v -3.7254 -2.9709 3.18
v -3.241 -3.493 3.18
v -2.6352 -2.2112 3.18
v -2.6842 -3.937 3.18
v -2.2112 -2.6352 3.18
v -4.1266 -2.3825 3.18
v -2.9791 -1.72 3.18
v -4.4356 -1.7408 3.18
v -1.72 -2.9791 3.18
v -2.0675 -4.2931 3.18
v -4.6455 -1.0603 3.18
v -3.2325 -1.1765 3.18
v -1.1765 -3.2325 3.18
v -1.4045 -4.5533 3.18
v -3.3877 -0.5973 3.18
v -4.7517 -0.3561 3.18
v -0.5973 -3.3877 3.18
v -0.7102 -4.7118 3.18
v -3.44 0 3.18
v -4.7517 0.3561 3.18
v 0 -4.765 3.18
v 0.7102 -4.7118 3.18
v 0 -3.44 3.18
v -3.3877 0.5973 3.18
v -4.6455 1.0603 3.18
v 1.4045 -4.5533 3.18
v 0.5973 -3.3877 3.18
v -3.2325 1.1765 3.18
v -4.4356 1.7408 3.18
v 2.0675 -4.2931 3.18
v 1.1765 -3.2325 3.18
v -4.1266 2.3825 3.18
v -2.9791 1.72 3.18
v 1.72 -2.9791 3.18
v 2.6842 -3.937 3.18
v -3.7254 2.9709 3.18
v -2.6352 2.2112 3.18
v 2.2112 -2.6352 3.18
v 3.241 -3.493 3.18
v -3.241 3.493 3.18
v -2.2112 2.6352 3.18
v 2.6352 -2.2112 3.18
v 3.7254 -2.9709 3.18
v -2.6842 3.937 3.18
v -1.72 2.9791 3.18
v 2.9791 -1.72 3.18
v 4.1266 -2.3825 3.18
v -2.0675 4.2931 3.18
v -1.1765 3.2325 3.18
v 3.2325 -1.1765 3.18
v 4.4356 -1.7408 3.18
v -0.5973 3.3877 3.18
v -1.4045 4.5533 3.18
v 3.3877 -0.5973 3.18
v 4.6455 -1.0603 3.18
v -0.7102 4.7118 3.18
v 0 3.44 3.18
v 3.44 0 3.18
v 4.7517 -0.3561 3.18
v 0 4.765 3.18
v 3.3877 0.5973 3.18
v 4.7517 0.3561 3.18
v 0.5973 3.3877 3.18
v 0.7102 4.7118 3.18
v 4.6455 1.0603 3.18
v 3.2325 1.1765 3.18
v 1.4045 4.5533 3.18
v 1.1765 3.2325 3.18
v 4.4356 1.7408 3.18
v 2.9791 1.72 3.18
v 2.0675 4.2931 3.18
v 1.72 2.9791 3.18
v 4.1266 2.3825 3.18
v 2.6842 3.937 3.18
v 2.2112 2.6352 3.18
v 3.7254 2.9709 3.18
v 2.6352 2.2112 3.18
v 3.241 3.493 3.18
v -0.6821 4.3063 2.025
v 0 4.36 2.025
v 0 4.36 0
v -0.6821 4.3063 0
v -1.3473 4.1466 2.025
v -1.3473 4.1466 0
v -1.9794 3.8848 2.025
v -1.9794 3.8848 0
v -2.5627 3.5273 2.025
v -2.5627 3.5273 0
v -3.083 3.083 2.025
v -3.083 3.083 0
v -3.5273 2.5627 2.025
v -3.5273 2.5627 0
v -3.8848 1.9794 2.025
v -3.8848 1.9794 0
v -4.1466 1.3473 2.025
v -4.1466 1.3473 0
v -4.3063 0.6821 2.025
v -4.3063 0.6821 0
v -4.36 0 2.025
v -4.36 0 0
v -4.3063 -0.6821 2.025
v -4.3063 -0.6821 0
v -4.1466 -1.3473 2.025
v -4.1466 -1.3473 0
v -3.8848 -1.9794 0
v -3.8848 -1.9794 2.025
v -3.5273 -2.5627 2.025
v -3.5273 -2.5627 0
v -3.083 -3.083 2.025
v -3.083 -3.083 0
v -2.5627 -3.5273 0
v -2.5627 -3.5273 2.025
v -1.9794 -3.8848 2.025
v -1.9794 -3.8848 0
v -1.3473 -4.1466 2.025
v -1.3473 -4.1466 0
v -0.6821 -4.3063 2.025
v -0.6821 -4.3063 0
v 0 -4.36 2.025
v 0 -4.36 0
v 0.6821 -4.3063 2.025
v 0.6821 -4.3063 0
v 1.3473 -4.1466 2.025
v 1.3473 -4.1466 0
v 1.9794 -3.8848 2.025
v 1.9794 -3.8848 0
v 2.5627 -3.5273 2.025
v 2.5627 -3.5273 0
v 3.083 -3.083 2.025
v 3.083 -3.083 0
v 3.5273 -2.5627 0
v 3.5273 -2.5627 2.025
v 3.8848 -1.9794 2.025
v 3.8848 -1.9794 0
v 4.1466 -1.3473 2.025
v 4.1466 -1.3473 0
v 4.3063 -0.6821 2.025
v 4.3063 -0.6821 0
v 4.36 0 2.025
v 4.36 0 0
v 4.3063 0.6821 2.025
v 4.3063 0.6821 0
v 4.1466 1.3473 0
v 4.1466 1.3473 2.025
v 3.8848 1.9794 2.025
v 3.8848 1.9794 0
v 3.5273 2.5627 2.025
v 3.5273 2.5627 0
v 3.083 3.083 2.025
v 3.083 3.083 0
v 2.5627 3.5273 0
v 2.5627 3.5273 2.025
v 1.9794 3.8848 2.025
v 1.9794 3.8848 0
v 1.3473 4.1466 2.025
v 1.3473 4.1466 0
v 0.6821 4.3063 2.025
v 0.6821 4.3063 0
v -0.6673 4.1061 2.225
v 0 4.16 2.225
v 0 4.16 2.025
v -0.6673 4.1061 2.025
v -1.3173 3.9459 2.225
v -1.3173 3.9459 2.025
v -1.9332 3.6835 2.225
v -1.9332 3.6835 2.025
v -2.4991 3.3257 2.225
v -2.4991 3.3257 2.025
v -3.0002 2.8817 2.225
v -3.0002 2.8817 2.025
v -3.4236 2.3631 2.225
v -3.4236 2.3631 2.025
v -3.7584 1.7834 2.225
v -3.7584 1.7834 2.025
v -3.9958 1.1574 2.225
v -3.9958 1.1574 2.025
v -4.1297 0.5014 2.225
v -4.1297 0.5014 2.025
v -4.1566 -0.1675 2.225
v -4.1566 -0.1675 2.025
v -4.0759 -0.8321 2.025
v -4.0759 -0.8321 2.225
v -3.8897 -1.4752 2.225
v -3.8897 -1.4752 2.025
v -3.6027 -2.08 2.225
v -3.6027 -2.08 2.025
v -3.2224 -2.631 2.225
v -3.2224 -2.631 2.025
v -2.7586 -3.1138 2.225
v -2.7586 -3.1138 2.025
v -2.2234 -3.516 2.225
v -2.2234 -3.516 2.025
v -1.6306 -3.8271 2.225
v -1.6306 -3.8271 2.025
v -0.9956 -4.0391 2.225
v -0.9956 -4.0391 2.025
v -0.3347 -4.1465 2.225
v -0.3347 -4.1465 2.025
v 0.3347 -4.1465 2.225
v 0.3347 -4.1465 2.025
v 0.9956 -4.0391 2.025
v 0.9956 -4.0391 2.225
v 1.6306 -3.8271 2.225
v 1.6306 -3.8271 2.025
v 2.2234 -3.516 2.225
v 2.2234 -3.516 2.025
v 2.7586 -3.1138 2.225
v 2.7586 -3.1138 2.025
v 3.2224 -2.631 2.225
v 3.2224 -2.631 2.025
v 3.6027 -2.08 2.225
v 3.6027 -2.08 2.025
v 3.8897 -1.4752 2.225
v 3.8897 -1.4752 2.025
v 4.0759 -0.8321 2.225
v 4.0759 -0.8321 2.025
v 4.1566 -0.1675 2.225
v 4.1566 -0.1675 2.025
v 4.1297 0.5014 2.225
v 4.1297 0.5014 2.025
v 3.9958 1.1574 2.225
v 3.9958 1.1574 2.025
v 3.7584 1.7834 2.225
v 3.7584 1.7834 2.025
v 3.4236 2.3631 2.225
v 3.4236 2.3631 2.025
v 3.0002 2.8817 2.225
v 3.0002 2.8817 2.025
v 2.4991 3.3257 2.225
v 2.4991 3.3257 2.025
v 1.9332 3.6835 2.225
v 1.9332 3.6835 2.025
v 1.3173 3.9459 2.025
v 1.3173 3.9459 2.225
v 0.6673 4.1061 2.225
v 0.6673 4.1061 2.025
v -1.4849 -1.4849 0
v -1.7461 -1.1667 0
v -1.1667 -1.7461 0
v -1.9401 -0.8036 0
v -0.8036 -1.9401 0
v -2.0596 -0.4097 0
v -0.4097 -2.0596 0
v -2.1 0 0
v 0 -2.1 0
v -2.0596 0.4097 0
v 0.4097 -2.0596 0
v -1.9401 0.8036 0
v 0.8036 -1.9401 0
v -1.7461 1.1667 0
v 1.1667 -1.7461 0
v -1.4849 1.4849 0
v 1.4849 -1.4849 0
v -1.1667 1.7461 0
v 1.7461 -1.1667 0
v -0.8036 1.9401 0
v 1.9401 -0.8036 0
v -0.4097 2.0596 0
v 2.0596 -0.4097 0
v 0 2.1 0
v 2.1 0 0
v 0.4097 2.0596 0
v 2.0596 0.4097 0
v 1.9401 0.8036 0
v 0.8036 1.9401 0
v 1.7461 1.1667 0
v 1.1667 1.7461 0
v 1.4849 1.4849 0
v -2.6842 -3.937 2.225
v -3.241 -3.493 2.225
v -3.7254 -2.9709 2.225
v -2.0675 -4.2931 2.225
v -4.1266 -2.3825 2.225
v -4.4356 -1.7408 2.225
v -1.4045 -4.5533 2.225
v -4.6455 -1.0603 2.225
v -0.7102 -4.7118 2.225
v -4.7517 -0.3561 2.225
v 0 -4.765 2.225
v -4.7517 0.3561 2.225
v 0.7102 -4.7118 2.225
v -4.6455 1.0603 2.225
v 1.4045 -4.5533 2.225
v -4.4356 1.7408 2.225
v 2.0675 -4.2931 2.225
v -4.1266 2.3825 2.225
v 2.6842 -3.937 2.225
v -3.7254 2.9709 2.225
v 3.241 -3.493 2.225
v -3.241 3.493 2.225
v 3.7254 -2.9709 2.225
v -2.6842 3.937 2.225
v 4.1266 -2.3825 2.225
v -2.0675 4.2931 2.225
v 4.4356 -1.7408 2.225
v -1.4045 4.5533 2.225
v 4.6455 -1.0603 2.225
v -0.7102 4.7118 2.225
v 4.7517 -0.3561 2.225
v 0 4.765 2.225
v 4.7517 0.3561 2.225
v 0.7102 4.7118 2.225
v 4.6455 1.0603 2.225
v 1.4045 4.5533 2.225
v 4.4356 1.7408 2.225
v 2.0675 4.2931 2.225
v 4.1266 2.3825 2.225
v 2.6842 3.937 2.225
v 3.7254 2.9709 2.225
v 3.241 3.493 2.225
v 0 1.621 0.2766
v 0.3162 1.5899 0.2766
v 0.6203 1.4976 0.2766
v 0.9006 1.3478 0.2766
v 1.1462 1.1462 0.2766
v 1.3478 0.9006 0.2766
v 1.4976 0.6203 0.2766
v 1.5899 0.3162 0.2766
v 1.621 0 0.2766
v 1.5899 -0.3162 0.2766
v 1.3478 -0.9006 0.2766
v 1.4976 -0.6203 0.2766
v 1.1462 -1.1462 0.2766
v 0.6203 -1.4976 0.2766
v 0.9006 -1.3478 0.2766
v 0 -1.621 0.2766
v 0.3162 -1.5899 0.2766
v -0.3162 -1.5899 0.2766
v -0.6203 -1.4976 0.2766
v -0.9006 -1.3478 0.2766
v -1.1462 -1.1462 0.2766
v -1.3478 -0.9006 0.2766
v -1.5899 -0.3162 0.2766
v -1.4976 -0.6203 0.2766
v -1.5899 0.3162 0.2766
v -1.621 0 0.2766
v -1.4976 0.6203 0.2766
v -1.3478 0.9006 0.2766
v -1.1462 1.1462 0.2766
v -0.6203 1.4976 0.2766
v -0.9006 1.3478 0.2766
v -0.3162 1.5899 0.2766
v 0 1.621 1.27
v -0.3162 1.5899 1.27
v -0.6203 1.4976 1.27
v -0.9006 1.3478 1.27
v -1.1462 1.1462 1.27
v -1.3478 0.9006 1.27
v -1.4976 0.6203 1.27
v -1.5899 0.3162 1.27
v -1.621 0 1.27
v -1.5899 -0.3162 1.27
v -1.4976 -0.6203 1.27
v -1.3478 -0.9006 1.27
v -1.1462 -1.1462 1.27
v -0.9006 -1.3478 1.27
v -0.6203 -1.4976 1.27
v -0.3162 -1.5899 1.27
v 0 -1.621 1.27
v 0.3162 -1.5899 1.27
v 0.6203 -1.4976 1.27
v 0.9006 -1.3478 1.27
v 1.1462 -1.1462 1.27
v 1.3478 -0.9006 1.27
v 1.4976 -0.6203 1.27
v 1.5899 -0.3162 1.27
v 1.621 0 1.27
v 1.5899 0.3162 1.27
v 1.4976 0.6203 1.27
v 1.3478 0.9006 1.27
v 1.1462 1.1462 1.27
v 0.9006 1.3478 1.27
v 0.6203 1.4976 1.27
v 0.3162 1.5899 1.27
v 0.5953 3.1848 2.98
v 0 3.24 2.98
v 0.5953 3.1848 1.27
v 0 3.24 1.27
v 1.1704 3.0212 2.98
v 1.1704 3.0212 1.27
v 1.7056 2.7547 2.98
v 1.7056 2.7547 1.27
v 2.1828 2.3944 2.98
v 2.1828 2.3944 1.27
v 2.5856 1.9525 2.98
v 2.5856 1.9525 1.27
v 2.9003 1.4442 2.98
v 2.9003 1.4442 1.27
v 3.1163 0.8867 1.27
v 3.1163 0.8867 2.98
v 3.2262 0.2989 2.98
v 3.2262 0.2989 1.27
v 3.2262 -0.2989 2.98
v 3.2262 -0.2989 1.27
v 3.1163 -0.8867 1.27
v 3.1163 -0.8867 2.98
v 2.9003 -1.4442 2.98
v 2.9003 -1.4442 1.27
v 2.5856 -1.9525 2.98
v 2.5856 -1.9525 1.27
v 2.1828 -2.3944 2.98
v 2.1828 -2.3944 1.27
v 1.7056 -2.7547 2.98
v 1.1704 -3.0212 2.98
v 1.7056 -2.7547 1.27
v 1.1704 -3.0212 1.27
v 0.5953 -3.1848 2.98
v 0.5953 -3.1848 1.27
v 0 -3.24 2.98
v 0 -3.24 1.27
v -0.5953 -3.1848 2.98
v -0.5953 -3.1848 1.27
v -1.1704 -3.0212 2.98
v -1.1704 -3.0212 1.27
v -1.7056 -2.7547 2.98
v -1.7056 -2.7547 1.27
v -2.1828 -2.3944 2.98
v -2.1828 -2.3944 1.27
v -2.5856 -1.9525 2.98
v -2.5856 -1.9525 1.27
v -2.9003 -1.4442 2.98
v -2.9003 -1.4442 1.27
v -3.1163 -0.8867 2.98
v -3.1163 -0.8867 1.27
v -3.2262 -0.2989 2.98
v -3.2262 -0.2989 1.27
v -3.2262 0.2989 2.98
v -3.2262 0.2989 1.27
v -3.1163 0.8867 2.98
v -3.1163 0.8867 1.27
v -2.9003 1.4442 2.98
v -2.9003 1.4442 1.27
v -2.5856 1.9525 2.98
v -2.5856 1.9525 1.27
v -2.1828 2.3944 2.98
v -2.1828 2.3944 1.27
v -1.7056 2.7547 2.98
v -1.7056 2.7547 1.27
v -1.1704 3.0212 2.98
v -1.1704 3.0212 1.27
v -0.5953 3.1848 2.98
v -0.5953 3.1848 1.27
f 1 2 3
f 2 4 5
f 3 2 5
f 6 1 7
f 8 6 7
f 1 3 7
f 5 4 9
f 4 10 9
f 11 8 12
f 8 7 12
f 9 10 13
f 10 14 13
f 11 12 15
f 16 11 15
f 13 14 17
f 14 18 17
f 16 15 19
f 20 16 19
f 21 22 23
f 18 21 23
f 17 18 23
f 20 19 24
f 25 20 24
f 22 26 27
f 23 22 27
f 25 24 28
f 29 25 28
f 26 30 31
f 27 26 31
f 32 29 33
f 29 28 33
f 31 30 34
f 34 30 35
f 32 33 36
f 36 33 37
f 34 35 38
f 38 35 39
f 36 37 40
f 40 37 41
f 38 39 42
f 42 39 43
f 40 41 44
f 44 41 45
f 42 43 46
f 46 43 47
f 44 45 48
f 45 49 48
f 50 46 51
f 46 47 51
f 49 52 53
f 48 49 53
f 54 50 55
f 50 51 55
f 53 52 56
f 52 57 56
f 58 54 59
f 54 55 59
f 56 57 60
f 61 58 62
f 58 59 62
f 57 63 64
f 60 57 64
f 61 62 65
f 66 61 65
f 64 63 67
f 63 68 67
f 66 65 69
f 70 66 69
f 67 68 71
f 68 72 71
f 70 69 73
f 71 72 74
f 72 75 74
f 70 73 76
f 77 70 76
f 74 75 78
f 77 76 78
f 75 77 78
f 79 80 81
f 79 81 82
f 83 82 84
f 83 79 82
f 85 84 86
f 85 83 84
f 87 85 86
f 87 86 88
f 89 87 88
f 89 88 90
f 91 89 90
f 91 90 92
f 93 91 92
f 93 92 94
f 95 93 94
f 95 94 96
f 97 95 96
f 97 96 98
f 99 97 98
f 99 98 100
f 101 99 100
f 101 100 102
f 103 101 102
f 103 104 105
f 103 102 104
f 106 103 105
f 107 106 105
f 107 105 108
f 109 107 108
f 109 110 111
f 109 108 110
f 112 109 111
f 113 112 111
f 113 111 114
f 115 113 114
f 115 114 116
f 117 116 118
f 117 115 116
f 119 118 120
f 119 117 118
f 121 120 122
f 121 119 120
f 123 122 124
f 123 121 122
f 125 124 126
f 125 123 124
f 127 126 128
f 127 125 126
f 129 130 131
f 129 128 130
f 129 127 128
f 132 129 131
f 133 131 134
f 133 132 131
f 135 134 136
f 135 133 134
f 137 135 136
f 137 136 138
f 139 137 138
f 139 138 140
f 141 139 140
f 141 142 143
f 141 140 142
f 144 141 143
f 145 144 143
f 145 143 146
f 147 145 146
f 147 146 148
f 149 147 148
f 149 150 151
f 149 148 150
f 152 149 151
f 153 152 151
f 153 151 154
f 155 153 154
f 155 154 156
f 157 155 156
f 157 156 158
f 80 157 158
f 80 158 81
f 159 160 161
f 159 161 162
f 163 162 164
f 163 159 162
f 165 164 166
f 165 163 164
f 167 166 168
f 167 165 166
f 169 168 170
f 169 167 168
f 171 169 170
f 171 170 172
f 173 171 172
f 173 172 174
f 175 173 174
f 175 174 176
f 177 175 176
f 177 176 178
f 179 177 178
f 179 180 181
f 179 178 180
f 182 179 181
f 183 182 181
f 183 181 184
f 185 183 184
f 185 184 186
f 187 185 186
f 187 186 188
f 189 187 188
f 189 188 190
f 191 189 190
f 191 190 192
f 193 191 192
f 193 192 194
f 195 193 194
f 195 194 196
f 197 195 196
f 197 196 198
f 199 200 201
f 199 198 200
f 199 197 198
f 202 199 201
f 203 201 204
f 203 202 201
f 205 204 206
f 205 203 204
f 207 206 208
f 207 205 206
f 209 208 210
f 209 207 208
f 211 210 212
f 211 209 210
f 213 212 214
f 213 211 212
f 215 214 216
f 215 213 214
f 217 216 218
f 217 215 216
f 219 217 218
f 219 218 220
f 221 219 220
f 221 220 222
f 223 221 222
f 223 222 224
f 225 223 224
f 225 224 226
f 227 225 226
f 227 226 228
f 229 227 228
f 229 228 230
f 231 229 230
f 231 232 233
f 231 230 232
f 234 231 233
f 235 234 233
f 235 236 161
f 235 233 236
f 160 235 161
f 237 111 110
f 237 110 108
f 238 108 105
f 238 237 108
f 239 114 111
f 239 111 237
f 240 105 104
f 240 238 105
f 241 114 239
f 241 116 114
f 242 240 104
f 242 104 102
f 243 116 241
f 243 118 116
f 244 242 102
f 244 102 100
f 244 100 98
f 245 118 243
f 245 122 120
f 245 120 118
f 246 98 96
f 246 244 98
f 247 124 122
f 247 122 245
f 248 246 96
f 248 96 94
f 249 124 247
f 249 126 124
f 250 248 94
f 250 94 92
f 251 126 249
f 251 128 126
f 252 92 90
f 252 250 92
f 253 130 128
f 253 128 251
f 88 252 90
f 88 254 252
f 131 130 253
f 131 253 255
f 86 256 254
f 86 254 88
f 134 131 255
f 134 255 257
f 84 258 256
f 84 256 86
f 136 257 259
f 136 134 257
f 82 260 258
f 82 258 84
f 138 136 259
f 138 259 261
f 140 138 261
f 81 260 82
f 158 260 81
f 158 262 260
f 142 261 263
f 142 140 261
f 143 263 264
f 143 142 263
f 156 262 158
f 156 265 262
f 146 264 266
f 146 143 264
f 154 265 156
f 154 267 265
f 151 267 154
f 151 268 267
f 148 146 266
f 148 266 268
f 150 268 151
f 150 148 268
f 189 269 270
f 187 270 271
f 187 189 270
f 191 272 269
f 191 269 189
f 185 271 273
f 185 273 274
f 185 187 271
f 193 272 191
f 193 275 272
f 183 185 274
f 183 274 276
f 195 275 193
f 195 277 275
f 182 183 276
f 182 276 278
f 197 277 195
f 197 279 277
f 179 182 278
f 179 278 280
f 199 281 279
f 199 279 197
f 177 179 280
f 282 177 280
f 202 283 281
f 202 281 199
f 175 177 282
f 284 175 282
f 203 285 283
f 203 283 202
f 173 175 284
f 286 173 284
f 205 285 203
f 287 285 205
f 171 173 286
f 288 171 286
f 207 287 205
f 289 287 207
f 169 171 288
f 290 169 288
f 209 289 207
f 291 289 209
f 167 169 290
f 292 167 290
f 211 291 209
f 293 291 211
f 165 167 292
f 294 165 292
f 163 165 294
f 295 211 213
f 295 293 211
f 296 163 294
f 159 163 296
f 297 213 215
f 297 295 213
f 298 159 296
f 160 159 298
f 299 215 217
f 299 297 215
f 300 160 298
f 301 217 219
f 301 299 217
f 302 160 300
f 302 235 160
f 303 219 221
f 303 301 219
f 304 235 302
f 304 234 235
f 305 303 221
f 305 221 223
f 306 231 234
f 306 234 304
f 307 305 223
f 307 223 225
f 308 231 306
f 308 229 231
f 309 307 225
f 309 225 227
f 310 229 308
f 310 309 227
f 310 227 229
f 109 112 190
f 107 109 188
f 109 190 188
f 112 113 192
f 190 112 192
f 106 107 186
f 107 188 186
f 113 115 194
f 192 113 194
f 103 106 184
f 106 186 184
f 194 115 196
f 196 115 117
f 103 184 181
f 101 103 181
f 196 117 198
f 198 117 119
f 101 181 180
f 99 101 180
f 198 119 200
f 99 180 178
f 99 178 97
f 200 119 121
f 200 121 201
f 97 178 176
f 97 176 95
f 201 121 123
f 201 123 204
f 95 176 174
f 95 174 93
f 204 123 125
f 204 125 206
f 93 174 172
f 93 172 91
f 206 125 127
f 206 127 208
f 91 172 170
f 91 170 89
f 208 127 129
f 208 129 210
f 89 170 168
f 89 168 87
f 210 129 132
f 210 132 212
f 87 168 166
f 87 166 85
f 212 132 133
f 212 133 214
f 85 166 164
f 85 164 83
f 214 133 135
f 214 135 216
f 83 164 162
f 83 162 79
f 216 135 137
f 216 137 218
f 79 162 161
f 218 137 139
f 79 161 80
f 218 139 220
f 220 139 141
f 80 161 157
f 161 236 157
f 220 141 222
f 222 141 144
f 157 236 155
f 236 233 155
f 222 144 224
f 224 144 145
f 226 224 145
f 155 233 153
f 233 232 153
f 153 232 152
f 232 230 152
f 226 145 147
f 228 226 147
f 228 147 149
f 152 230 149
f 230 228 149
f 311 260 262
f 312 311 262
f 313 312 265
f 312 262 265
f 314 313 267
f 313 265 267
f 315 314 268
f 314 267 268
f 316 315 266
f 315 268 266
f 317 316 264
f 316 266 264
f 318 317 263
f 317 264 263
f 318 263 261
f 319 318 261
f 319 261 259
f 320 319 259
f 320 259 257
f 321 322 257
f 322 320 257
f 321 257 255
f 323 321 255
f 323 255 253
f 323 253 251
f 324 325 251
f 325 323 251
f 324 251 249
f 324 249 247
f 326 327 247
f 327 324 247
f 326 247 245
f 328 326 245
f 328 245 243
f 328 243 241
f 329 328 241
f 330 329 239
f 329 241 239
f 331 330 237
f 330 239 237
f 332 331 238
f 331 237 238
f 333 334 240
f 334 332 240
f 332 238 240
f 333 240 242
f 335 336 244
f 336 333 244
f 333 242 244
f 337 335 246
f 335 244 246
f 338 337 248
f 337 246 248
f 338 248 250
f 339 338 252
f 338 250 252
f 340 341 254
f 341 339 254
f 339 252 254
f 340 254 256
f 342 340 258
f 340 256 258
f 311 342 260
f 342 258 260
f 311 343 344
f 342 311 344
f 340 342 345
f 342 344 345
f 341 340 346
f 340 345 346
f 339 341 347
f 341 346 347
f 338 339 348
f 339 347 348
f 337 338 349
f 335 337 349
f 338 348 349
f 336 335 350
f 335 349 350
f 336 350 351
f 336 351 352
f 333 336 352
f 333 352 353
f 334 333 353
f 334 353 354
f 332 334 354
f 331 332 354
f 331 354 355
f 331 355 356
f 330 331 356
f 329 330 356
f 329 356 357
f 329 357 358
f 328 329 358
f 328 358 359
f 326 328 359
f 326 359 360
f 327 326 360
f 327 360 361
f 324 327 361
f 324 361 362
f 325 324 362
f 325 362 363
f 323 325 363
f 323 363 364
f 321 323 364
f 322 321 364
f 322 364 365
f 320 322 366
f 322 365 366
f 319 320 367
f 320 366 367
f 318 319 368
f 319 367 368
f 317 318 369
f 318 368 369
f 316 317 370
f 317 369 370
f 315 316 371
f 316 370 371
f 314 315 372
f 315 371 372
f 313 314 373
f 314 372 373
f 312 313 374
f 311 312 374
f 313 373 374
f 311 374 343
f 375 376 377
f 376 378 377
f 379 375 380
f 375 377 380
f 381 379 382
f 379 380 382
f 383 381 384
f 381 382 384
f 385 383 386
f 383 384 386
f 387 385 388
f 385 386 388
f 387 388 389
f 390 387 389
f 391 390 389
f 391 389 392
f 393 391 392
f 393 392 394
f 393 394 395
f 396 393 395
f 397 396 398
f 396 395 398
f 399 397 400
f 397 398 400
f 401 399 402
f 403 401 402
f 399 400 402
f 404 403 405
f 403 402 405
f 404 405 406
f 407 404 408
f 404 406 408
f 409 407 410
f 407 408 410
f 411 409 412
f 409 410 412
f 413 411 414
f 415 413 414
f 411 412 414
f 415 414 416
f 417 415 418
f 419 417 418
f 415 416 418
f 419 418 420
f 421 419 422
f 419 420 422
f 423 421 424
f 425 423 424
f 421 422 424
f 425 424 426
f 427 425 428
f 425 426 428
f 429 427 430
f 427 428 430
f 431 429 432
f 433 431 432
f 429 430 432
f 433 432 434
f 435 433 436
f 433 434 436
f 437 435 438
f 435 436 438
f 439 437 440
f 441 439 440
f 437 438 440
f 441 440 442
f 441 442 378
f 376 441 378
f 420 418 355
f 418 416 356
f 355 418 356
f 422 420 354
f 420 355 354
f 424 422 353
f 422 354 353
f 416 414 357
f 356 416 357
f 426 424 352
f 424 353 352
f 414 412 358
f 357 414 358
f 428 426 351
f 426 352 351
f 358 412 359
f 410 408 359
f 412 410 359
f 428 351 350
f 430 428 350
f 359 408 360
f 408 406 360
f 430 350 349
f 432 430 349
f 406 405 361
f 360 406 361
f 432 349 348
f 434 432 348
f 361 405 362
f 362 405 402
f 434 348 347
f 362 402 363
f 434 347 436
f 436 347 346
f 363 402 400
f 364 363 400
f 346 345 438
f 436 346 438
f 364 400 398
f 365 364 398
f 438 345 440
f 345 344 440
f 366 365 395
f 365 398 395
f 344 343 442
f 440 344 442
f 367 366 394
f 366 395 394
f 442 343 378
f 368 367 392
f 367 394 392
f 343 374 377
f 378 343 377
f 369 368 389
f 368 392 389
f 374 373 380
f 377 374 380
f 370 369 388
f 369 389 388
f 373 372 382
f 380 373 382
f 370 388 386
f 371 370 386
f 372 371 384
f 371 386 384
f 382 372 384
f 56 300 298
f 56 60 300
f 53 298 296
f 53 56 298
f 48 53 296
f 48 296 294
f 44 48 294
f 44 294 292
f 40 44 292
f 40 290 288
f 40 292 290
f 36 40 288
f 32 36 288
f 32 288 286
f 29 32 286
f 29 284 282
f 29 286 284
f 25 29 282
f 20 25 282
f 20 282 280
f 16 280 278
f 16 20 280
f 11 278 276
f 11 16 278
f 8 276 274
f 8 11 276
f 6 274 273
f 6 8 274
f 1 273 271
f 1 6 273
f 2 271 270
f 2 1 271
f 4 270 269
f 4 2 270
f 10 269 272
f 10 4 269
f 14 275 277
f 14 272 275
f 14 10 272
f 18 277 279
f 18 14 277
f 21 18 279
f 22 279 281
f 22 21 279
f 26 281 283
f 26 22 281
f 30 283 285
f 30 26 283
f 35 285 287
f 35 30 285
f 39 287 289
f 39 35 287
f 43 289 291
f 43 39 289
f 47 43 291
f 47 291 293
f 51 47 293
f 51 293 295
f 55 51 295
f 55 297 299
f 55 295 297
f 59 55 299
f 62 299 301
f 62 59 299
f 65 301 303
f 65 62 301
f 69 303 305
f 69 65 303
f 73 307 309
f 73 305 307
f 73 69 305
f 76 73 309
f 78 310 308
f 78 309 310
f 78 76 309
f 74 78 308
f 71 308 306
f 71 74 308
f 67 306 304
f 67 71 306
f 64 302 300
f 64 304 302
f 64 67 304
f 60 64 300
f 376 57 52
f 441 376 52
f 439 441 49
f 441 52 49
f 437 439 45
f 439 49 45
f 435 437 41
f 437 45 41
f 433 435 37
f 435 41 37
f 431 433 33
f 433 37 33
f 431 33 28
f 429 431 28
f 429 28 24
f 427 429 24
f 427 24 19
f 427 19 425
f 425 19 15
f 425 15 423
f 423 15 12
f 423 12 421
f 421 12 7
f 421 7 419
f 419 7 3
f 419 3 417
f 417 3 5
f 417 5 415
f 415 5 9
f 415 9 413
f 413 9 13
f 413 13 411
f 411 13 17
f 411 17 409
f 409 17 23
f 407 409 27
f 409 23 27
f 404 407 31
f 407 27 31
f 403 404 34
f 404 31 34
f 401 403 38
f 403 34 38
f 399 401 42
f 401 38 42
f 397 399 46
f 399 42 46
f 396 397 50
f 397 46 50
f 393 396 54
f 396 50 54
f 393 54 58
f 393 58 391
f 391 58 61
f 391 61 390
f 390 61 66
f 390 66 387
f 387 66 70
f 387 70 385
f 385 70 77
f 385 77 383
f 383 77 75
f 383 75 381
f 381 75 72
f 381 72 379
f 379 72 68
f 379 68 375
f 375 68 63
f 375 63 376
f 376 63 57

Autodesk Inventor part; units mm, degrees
ref_plane "YZ Plane" through (0, 0, 0) normal (1, 0, 0) x (0, 1, 0)
ref_plane "XZ Plane" through (0, 0, 0) normal (0, 1, 0) x (-1, 0, 0)
ref_plane "XY Plane" through (0, 0, 0) normal (0, 0, 1) x (1, 0, 0)
sketch "Sketch1" plane through (0, 0, 0) normal (1, 0, 0) x (0, 1, 0)
  line L0 (0, 0) -> (4.36, 0)
  line L1 (4.36, 0) -> (4.36, 2.025)
  line L2 (4.36, 2.025) -> (4.16, 2.025)
  line L3 (4.16, 2.025) -> (4.16, 2.225)
  line L4 (4.16, 2.225) -> (4.765, 2.225)
  line L5 (4.765, 2.225) -> (4.765, 3.18)
  line L6 (4.765, 3.18) -> (3.44, 3.18)
  line L7 (3.24, 2.98) -> (3.24, 1.27)
  line L8 (3.24, 1.27) -> (0, 1.27)
  line L9 (0, 1.27) -> (0, 0)
  line L10 (3.44, 3.18) -> (3.24, 2.98)
  point P0 (3.24, 3.18)
  dimension "d1" = 8.72
  dimension "d4" = 0.2
  dimension "d5" = 3.18
  dimension "d6" = 9.53
  dimension "d7" = 1.91
  dimension "d8" = 6.48
  dimension "d9" = 0.955
  dimension "d28" = 0.2
  dimension "d29" = 0.2
revolve "Revolution1" add sketch "Sketch1" angle 360 about axis through (0, 0, 1.27) along (0, 0, -1)
hole "Hole1" at (0, 0, 0) direction (0, 0, 1) diameter 3.242 end through all countersink diameter 4.2 countersink angle 120 thread size "M4x0.7" class "6H" standard "ANSI Metric M Profile"
equation "\"d1\" = C_"
equation "\"d4\" = TD_d"
equation "\"d5\" = A_"
equation "\"d6\" = E_"
equation "\"d7\" = H_"
equation "\"d8\" = B"
equation "\"d9\" = 0.5 * H_"
equation "\"d28\" = TD_d"
equation "\"d29\" = d28"
equation "\"d19\" = 1.05 * NND"
equation "\"A_\" = 3.18"
equation "\"B\" = 6.48"
equation "\"C_\" = 8.72"
equation "\"E_\" = 9.53"
equation "\"H_\" = 1.91"
equation "\"NND\" = 4"
equation "\"TD_d\" = 0.2"
equation "\"Min_Sheet_for_Self_Clinching\" = 1.27"
equation "\"Min_Sheet_for_Flush_Installation\" = 3.18"
equation "\"Min_Dist\" = 8.64"
equation "\"H_Size\" = 8.74"
equation "\"TL\" = 1.27"
properties part number "PR10-M4" material "Stainless Steel"
